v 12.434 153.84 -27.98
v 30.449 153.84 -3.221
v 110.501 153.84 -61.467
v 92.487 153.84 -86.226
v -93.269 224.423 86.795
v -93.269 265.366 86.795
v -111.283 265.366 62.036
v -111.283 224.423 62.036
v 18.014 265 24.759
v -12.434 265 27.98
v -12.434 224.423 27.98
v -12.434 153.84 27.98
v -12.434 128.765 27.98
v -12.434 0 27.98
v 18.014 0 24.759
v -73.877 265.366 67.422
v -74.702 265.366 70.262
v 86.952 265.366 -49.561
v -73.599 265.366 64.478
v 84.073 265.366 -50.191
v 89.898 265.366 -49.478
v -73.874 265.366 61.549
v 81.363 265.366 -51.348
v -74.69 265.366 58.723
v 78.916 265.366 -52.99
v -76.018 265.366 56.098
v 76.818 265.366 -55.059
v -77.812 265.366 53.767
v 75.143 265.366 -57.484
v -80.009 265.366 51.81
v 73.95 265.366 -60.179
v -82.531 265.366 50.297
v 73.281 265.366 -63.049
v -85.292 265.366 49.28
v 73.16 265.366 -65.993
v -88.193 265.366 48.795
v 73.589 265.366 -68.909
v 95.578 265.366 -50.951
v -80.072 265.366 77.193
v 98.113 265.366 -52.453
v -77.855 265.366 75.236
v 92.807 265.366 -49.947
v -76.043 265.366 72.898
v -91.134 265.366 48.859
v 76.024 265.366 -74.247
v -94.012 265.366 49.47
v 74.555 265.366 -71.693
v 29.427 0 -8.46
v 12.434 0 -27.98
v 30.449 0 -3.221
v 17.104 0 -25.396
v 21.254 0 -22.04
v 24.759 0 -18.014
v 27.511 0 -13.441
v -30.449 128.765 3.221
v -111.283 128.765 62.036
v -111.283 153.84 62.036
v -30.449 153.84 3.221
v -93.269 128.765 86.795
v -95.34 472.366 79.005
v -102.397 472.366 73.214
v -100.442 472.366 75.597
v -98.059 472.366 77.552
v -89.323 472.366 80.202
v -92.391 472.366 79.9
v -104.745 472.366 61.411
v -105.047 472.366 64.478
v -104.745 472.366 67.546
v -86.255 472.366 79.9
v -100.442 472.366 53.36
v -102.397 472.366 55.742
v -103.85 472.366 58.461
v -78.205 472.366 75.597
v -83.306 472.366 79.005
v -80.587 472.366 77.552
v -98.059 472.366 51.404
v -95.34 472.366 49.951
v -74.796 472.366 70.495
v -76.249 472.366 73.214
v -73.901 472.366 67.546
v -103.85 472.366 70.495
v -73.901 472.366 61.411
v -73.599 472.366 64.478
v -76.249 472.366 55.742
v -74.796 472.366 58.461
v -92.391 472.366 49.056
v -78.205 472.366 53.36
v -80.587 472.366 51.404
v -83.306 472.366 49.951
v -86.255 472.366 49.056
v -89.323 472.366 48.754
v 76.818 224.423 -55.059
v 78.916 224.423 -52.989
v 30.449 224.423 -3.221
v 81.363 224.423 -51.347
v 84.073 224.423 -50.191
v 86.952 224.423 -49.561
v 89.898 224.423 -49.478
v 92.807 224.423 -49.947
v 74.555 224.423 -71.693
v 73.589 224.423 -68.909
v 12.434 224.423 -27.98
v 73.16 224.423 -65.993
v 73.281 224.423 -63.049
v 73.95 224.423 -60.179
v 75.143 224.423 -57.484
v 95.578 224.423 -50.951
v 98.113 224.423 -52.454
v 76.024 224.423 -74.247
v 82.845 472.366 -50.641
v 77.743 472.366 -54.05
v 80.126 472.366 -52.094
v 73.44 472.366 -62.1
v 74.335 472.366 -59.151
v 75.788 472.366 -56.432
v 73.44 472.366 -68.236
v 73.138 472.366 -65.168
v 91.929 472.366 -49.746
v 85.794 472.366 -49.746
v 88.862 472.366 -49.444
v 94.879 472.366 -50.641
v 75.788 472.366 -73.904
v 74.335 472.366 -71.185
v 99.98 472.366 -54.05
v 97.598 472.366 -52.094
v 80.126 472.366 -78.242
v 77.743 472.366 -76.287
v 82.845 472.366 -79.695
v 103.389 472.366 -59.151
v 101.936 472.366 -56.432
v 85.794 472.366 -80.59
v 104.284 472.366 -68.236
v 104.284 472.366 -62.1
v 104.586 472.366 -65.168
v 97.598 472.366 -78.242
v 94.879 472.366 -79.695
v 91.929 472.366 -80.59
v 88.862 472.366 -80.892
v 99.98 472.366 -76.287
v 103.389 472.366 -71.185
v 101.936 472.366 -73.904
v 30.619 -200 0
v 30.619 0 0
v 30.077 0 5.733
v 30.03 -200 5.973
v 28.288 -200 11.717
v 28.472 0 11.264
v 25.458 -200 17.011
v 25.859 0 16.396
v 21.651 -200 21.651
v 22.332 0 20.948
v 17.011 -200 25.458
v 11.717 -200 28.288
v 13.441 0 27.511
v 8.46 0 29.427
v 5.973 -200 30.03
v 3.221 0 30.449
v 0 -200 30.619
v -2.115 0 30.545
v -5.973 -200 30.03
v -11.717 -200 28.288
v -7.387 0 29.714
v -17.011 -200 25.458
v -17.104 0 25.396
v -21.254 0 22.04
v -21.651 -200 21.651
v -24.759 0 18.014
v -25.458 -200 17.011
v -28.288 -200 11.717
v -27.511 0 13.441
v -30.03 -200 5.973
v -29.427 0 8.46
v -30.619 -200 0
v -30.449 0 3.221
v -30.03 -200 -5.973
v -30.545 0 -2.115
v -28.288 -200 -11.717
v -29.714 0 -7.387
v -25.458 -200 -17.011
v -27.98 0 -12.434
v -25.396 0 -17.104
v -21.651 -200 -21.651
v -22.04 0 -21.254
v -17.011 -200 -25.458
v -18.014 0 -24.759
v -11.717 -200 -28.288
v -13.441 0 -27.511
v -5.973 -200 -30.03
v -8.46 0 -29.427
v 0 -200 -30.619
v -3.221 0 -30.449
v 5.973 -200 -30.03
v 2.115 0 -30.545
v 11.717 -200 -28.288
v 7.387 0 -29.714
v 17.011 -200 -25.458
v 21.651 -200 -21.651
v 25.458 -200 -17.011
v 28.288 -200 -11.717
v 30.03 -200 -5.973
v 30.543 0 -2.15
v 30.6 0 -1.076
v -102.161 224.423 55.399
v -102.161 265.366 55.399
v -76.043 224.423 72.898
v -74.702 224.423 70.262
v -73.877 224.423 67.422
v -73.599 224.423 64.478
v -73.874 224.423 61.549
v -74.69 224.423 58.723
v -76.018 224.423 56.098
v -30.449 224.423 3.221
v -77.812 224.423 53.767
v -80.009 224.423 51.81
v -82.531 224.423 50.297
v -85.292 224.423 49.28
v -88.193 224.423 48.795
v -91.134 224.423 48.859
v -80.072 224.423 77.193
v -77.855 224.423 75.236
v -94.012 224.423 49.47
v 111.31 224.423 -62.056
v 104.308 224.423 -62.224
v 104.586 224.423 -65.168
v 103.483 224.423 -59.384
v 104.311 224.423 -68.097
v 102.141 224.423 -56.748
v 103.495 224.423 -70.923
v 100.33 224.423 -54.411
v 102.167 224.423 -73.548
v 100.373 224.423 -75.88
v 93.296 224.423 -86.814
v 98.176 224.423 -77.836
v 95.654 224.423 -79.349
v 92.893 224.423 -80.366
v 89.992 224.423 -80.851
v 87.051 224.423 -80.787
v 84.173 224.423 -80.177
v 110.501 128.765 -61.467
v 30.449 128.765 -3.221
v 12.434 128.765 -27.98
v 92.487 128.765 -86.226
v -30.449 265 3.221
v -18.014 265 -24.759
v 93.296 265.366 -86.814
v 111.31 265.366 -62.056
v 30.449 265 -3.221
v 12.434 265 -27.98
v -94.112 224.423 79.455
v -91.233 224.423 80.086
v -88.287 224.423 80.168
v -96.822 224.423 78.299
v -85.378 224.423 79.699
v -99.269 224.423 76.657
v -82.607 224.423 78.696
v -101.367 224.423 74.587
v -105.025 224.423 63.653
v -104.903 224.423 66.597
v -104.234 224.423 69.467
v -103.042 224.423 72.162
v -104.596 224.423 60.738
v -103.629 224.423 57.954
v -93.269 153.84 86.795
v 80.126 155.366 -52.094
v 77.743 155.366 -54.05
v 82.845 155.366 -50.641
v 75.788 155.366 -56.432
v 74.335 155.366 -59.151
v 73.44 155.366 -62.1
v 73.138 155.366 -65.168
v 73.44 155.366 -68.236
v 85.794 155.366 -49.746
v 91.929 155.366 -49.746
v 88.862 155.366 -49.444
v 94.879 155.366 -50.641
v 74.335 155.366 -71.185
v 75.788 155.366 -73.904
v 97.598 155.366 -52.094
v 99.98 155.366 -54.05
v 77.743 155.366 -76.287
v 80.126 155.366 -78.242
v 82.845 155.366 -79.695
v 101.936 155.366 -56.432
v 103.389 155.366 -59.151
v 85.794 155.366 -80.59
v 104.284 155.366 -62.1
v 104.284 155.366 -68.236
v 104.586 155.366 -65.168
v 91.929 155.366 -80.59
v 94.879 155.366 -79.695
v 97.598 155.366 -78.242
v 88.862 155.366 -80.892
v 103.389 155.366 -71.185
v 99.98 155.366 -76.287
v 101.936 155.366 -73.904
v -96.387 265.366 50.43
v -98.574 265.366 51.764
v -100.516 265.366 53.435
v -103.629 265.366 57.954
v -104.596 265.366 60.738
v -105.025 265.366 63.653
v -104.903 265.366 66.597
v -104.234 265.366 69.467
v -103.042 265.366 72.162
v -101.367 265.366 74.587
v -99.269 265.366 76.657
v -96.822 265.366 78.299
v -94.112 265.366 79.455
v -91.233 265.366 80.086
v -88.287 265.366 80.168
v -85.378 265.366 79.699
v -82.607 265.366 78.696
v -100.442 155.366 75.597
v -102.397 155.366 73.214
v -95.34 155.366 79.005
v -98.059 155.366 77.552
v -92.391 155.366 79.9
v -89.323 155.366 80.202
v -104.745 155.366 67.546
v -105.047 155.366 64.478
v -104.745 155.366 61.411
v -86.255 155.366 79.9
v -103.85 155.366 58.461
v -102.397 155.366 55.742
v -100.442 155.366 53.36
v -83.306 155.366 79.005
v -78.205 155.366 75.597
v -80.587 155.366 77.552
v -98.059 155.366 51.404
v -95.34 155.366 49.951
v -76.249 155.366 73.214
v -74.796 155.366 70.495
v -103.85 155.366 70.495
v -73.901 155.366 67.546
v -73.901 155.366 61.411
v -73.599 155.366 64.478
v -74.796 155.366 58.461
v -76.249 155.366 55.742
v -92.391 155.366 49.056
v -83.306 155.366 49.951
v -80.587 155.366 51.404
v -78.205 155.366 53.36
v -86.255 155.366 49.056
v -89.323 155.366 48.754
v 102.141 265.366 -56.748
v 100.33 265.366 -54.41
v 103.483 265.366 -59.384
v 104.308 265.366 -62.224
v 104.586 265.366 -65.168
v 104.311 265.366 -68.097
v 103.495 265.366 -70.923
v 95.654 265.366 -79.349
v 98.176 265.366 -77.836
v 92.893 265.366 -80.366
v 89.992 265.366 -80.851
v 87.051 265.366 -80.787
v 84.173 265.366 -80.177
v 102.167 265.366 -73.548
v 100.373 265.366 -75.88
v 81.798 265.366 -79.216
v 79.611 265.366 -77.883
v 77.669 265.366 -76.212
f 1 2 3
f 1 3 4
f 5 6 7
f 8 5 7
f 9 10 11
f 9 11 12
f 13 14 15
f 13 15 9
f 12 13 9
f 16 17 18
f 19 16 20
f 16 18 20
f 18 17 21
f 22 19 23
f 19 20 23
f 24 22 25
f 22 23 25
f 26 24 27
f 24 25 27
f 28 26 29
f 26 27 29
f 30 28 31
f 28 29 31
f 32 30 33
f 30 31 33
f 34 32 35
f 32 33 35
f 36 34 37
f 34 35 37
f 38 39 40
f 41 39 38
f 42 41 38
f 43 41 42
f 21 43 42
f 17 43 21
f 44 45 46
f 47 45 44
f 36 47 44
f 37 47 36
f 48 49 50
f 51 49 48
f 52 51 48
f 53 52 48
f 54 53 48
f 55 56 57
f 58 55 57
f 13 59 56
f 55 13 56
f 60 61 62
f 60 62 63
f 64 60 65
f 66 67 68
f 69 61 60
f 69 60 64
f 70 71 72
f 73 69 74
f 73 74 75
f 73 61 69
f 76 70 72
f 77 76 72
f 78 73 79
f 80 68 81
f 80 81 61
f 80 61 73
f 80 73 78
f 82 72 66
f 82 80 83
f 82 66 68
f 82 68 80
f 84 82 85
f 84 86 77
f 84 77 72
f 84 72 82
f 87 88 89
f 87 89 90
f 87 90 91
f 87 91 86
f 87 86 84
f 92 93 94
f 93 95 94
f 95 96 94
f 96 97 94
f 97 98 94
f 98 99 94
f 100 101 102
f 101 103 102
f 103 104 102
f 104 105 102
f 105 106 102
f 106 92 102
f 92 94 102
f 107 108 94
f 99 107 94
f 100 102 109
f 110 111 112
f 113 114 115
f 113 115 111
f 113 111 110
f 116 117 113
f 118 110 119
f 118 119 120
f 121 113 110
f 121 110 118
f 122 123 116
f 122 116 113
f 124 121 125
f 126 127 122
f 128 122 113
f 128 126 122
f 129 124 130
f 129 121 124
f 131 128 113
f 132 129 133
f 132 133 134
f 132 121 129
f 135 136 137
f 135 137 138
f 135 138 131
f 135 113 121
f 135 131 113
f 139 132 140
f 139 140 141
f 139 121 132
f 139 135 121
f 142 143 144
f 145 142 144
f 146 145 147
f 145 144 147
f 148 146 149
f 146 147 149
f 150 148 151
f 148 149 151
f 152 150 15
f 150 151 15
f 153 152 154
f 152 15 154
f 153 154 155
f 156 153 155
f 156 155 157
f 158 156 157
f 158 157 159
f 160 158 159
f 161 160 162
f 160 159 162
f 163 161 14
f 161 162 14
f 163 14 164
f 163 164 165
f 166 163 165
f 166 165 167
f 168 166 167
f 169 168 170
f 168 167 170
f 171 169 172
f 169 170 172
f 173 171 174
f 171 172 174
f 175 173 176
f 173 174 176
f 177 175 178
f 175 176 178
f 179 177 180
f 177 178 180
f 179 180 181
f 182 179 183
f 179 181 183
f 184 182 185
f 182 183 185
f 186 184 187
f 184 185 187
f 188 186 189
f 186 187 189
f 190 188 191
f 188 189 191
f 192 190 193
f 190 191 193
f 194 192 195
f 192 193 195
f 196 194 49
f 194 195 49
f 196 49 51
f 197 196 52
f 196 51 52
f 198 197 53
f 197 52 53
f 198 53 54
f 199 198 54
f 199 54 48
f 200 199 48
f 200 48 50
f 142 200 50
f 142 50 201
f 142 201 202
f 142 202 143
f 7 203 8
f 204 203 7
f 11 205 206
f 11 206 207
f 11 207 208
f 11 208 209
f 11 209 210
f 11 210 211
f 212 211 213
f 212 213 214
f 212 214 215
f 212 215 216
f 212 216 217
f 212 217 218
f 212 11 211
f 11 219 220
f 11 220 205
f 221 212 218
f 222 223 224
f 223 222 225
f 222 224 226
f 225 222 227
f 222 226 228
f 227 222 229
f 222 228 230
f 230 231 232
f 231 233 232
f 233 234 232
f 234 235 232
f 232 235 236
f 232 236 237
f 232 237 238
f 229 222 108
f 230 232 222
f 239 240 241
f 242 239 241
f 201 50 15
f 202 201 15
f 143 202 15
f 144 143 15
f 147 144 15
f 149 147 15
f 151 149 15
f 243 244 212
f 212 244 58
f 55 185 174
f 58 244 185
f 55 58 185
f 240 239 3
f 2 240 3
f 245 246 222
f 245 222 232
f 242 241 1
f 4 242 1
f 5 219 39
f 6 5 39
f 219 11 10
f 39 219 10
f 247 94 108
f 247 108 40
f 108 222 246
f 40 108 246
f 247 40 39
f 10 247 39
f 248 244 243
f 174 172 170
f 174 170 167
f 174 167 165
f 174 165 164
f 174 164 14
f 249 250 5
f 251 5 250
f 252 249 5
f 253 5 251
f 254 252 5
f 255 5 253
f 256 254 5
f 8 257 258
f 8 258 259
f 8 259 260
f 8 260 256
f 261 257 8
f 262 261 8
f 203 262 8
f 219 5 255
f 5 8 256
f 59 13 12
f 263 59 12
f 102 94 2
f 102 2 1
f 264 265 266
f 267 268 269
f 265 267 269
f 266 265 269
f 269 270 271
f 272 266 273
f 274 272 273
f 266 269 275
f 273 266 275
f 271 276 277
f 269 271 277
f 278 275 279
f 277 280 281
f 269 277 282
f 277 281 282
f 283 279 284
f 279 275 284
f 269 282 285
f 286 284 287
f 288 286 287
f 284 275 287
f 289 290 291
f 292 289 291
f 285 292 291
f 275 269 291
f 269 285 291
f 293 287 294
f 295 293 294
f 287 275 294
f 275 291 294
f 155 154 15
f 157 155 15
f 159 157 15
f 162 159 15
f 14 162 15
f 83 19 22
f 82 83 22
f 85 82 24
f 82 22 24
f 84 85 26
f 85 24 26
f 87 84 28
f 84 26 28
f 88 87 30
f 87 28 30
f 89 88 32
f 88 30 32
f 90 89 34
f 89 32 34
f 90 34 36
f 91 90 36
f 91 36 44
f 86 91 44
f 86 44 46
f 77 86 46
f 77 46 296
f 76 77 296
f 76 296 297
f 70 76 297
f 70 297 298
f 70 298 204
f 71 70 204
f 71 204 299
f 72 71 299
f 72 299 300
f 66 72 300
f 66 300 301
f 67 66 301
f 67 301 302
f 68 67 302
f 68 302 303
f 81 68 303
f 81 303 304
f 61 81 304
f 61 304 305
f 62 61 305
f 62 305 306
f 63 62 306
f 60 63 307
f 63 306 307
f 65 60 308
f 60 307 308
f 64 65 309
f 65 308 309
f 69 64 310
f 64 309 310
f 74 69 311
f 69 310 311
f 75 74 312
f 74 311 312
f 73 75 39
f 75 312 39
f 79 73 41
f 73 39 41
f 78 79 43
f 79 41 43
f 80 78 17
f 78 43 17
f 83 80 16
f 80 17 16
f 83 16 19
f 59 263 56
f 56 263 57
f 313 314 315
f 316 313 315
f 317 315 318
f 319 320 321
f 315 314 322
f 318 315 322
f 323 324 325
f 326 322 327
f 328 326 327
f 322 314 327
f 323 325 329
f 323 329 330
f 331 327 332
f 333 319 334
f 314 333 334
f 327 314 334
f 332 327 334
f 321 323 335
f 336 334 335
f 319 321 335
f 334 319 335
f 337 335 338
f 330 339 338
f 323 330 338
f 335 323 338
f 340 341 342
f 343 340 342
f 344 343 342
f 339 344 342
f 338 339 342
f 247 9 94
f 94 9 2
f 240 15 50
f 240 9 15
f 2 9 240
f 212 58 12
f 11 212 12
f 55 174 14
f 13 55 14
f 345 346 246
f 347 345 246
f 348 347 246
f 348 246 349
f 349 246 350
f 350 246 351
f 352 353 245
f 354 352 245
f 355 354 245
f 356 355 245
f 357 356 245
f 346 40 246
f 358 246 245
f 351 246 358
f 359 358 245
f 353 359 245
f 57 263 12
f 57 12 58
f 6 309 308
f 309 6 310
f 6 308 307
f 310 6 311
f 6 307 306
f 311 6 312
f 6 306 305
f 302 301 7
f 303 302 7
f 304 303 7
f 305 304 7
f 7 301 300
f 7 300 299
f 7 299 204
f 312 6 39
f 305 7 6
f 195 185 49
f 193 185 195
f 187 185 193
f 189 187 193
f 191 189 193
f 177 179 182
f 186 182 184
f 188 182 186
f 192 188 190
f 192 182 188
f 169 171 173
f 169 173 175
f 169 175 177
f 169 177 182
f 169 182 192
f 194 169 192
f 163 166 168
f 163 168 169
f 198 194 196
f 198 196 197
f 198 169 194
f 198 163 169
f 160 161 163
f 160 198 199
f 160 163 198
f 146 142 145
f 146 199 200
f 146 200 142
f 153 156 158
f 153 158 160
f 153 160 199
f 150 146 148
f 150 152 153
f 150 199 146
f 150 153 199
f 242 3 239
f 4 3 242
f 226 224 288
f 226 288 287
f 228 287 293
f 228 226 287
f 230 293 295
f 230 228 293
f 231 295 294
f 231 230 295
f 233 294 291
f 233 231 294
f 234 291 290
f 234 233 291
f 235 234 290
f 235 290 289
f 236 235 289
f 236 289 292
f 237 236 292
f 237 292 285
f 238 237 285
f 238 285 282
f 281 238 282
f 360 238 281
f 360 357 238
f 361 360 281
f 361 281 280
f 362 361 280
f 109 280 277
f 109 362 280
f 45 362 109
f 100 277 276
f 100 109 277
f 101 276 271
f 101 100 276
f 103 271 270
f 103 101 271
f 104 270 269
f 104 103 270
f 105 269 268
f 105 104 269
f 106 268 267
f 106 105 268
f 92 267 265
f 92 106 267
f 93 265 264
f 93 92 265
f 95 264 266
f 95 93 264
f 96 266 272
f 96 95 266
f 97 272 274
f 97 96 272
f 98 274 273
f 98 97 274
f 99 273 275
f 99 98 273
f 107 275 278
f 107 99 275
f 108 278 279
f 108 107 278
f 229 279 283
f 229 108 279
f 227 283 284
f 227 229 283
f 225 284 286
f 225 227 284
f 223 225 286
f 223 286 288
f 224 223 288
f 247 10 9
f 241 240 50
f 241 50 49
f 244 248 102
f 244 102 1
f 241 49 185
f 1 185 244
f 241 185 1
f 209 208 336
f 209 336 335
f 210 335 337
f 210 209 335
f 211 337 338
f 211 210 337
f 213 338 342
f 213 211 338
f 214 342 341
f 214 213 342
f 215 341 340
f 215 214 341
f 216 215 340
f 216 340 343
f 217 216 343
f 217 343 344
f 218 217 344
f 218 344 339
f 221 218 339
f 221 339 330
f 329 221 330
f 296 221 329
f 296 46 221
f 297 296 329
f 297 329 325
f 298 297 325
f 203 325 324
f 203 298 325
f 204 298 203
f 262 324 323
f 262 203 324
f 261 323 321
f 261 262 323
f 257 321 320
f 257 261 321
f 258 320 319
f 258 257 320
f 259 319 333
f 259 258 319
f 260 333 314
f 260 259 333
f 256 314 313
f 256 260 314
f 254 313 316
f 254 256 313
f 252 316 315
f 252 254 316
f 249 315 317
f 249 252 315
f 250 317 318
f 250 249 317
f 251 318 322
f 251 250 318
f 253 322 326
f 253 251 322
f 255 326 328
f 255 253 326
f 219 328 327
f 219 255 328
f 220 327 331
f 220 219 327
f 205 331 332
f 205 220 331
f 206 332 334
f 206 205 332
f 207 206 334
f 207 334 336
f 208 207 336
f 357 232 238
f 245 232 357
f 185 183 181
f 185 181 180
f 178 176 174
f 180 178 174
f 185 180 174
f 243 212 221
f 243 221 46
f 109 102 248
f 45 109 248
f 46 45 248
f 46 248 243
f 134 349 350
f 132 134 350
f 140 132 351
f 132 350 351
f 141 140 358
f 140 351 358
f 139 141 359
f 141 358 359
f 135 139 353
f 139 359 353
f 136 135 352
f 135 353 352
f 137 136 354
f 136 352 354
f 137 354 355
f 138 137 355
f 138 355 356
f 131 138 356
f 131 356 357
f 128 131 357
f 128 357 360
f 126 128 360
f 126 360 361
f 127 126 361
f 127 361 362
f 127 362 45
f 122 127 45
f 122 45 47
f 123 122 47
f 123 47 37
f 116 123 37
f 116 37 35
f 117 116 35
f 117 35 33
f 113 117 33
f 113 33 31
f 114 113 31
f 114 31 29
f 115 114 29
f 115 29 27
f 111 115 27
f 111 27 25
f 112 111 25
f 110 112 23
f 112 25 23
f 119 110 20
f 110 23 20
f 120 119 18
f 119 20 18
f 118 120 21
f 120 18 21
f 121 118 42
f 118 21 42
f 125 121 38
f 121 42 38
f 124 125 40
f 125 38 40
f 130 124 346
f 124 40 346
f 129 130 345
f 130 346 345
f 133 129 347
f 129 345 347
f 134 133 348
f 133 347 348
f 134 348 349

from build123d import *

# Parameters (mm, degrees)
EXTRUDE_1_DEPTH      = 265
SKETCH_3_W           = 30.618601132
SKETCH_3_H           = 40.943060599
EXTRUDE_2_DEPTH      = 100
EXTRUDE_2_DEPTH_BACK = 153
SKETCH_5_R           = 15.723920129
EXTRUDE_3_DEPTH      = 207
EXTRUDE_3_DEPTH_BACK = 110
SKETCH_7_W           = 30.618601132
SKETCH_7_H           = 25.075478903
EXTRUDE_4_DEPTH      = 99
EXTRUDE_4_DEPTH_BACK = 153
SKETCH_8_R           = 30.618601132
EXTRUDE_5_DEPTH      = 200


with BuildPart() as part:
    # Эскиз1 → Бобышка-Вытянуть1 (new body)
    with BuildSketch(Plane(origin=(0, 0, 0), x_dir=(1, 0, 0), z_dir=(0, 1, 0))):
        Polygon((18.014188727, -24.758589212), (30.448661583, 3.22145046), (12.434472856, 27.980039673), (-18.014188727, 24.758589212), (-30.448661583, -3.22145046), (-12.434472856, -27.980039673), align=None)
    extrude(amount=EXTRUDE_1_DEPTH)

    # Эскиз3 → Бобышка-Вытянуть2 (add, two sides)
    with BuildSketch(Plane(origin=(21.44156722, 0, -15.600745066), x_dir=(-0.588341337, 0, -0.808612683), z_dir=(0.808612683, 0, -0.588341337))) as extrude_2_sk:
        with Locations((0, 244.89483014)):
            Rectangle(SKETCH_3_W, SKETCH_3_H)
    extrude(amount=EXTRUDE_2_DEPTH)
    extrude(extrude_2_sk.sketch, amount=-EXTRUDE_2_DEPTH_BACK)

    # Эскиз5 → Бобышка-Вытянуть3 (add, two sides)
    with BuildSketch(Plane(origin=(0, 265.366360439, 0), x_dir=(1, 0, 0), z_dir=(0, 1, 0))) as extrude_3_sk:
        with Locations((-89.323031668, -64.478103556)):
            Circle(SKETCH_5_R)
        with Locations((88.86181825, 65.168036102)):
            Circle(SKETCH_5_R)
    extrude(amount=EXTRUDE_3_DEPTH)
    extrude(extrude_3_sk.sketch, amount=-EXTRUDE_3_DEPTH_BACK)

    # Эскиз7 → Бобышка-Вытянуть4 (add, two sides)
    with BuildSketch(Plane(origin=(21.44156722, 0, -15.600745066), x_dir=(-0.588341337, 0, -0.808612683), z_dir=(0.808612683, 0, -0.588341337))) as extrude_4_sk:
        with Locations((0, 141.302670342)):
            Rectangle(SKETCH_7_W, SKETCH_7_H)
    extrude(amount=EXTRUDE_4_DEPTH)
    extrude(extrude_4_sk.sketch, amount=-EXTRUDE_4_DEPTH_BACK)

    # Эскиз8 → Бобышка-Вытянуть5 (add)
    with BuildSketch(Plane.XZ):
        Circle(SKETCH_8_R)
    extrude(amount=EXTRUDE_5_DEPTH)


solid = part.part
